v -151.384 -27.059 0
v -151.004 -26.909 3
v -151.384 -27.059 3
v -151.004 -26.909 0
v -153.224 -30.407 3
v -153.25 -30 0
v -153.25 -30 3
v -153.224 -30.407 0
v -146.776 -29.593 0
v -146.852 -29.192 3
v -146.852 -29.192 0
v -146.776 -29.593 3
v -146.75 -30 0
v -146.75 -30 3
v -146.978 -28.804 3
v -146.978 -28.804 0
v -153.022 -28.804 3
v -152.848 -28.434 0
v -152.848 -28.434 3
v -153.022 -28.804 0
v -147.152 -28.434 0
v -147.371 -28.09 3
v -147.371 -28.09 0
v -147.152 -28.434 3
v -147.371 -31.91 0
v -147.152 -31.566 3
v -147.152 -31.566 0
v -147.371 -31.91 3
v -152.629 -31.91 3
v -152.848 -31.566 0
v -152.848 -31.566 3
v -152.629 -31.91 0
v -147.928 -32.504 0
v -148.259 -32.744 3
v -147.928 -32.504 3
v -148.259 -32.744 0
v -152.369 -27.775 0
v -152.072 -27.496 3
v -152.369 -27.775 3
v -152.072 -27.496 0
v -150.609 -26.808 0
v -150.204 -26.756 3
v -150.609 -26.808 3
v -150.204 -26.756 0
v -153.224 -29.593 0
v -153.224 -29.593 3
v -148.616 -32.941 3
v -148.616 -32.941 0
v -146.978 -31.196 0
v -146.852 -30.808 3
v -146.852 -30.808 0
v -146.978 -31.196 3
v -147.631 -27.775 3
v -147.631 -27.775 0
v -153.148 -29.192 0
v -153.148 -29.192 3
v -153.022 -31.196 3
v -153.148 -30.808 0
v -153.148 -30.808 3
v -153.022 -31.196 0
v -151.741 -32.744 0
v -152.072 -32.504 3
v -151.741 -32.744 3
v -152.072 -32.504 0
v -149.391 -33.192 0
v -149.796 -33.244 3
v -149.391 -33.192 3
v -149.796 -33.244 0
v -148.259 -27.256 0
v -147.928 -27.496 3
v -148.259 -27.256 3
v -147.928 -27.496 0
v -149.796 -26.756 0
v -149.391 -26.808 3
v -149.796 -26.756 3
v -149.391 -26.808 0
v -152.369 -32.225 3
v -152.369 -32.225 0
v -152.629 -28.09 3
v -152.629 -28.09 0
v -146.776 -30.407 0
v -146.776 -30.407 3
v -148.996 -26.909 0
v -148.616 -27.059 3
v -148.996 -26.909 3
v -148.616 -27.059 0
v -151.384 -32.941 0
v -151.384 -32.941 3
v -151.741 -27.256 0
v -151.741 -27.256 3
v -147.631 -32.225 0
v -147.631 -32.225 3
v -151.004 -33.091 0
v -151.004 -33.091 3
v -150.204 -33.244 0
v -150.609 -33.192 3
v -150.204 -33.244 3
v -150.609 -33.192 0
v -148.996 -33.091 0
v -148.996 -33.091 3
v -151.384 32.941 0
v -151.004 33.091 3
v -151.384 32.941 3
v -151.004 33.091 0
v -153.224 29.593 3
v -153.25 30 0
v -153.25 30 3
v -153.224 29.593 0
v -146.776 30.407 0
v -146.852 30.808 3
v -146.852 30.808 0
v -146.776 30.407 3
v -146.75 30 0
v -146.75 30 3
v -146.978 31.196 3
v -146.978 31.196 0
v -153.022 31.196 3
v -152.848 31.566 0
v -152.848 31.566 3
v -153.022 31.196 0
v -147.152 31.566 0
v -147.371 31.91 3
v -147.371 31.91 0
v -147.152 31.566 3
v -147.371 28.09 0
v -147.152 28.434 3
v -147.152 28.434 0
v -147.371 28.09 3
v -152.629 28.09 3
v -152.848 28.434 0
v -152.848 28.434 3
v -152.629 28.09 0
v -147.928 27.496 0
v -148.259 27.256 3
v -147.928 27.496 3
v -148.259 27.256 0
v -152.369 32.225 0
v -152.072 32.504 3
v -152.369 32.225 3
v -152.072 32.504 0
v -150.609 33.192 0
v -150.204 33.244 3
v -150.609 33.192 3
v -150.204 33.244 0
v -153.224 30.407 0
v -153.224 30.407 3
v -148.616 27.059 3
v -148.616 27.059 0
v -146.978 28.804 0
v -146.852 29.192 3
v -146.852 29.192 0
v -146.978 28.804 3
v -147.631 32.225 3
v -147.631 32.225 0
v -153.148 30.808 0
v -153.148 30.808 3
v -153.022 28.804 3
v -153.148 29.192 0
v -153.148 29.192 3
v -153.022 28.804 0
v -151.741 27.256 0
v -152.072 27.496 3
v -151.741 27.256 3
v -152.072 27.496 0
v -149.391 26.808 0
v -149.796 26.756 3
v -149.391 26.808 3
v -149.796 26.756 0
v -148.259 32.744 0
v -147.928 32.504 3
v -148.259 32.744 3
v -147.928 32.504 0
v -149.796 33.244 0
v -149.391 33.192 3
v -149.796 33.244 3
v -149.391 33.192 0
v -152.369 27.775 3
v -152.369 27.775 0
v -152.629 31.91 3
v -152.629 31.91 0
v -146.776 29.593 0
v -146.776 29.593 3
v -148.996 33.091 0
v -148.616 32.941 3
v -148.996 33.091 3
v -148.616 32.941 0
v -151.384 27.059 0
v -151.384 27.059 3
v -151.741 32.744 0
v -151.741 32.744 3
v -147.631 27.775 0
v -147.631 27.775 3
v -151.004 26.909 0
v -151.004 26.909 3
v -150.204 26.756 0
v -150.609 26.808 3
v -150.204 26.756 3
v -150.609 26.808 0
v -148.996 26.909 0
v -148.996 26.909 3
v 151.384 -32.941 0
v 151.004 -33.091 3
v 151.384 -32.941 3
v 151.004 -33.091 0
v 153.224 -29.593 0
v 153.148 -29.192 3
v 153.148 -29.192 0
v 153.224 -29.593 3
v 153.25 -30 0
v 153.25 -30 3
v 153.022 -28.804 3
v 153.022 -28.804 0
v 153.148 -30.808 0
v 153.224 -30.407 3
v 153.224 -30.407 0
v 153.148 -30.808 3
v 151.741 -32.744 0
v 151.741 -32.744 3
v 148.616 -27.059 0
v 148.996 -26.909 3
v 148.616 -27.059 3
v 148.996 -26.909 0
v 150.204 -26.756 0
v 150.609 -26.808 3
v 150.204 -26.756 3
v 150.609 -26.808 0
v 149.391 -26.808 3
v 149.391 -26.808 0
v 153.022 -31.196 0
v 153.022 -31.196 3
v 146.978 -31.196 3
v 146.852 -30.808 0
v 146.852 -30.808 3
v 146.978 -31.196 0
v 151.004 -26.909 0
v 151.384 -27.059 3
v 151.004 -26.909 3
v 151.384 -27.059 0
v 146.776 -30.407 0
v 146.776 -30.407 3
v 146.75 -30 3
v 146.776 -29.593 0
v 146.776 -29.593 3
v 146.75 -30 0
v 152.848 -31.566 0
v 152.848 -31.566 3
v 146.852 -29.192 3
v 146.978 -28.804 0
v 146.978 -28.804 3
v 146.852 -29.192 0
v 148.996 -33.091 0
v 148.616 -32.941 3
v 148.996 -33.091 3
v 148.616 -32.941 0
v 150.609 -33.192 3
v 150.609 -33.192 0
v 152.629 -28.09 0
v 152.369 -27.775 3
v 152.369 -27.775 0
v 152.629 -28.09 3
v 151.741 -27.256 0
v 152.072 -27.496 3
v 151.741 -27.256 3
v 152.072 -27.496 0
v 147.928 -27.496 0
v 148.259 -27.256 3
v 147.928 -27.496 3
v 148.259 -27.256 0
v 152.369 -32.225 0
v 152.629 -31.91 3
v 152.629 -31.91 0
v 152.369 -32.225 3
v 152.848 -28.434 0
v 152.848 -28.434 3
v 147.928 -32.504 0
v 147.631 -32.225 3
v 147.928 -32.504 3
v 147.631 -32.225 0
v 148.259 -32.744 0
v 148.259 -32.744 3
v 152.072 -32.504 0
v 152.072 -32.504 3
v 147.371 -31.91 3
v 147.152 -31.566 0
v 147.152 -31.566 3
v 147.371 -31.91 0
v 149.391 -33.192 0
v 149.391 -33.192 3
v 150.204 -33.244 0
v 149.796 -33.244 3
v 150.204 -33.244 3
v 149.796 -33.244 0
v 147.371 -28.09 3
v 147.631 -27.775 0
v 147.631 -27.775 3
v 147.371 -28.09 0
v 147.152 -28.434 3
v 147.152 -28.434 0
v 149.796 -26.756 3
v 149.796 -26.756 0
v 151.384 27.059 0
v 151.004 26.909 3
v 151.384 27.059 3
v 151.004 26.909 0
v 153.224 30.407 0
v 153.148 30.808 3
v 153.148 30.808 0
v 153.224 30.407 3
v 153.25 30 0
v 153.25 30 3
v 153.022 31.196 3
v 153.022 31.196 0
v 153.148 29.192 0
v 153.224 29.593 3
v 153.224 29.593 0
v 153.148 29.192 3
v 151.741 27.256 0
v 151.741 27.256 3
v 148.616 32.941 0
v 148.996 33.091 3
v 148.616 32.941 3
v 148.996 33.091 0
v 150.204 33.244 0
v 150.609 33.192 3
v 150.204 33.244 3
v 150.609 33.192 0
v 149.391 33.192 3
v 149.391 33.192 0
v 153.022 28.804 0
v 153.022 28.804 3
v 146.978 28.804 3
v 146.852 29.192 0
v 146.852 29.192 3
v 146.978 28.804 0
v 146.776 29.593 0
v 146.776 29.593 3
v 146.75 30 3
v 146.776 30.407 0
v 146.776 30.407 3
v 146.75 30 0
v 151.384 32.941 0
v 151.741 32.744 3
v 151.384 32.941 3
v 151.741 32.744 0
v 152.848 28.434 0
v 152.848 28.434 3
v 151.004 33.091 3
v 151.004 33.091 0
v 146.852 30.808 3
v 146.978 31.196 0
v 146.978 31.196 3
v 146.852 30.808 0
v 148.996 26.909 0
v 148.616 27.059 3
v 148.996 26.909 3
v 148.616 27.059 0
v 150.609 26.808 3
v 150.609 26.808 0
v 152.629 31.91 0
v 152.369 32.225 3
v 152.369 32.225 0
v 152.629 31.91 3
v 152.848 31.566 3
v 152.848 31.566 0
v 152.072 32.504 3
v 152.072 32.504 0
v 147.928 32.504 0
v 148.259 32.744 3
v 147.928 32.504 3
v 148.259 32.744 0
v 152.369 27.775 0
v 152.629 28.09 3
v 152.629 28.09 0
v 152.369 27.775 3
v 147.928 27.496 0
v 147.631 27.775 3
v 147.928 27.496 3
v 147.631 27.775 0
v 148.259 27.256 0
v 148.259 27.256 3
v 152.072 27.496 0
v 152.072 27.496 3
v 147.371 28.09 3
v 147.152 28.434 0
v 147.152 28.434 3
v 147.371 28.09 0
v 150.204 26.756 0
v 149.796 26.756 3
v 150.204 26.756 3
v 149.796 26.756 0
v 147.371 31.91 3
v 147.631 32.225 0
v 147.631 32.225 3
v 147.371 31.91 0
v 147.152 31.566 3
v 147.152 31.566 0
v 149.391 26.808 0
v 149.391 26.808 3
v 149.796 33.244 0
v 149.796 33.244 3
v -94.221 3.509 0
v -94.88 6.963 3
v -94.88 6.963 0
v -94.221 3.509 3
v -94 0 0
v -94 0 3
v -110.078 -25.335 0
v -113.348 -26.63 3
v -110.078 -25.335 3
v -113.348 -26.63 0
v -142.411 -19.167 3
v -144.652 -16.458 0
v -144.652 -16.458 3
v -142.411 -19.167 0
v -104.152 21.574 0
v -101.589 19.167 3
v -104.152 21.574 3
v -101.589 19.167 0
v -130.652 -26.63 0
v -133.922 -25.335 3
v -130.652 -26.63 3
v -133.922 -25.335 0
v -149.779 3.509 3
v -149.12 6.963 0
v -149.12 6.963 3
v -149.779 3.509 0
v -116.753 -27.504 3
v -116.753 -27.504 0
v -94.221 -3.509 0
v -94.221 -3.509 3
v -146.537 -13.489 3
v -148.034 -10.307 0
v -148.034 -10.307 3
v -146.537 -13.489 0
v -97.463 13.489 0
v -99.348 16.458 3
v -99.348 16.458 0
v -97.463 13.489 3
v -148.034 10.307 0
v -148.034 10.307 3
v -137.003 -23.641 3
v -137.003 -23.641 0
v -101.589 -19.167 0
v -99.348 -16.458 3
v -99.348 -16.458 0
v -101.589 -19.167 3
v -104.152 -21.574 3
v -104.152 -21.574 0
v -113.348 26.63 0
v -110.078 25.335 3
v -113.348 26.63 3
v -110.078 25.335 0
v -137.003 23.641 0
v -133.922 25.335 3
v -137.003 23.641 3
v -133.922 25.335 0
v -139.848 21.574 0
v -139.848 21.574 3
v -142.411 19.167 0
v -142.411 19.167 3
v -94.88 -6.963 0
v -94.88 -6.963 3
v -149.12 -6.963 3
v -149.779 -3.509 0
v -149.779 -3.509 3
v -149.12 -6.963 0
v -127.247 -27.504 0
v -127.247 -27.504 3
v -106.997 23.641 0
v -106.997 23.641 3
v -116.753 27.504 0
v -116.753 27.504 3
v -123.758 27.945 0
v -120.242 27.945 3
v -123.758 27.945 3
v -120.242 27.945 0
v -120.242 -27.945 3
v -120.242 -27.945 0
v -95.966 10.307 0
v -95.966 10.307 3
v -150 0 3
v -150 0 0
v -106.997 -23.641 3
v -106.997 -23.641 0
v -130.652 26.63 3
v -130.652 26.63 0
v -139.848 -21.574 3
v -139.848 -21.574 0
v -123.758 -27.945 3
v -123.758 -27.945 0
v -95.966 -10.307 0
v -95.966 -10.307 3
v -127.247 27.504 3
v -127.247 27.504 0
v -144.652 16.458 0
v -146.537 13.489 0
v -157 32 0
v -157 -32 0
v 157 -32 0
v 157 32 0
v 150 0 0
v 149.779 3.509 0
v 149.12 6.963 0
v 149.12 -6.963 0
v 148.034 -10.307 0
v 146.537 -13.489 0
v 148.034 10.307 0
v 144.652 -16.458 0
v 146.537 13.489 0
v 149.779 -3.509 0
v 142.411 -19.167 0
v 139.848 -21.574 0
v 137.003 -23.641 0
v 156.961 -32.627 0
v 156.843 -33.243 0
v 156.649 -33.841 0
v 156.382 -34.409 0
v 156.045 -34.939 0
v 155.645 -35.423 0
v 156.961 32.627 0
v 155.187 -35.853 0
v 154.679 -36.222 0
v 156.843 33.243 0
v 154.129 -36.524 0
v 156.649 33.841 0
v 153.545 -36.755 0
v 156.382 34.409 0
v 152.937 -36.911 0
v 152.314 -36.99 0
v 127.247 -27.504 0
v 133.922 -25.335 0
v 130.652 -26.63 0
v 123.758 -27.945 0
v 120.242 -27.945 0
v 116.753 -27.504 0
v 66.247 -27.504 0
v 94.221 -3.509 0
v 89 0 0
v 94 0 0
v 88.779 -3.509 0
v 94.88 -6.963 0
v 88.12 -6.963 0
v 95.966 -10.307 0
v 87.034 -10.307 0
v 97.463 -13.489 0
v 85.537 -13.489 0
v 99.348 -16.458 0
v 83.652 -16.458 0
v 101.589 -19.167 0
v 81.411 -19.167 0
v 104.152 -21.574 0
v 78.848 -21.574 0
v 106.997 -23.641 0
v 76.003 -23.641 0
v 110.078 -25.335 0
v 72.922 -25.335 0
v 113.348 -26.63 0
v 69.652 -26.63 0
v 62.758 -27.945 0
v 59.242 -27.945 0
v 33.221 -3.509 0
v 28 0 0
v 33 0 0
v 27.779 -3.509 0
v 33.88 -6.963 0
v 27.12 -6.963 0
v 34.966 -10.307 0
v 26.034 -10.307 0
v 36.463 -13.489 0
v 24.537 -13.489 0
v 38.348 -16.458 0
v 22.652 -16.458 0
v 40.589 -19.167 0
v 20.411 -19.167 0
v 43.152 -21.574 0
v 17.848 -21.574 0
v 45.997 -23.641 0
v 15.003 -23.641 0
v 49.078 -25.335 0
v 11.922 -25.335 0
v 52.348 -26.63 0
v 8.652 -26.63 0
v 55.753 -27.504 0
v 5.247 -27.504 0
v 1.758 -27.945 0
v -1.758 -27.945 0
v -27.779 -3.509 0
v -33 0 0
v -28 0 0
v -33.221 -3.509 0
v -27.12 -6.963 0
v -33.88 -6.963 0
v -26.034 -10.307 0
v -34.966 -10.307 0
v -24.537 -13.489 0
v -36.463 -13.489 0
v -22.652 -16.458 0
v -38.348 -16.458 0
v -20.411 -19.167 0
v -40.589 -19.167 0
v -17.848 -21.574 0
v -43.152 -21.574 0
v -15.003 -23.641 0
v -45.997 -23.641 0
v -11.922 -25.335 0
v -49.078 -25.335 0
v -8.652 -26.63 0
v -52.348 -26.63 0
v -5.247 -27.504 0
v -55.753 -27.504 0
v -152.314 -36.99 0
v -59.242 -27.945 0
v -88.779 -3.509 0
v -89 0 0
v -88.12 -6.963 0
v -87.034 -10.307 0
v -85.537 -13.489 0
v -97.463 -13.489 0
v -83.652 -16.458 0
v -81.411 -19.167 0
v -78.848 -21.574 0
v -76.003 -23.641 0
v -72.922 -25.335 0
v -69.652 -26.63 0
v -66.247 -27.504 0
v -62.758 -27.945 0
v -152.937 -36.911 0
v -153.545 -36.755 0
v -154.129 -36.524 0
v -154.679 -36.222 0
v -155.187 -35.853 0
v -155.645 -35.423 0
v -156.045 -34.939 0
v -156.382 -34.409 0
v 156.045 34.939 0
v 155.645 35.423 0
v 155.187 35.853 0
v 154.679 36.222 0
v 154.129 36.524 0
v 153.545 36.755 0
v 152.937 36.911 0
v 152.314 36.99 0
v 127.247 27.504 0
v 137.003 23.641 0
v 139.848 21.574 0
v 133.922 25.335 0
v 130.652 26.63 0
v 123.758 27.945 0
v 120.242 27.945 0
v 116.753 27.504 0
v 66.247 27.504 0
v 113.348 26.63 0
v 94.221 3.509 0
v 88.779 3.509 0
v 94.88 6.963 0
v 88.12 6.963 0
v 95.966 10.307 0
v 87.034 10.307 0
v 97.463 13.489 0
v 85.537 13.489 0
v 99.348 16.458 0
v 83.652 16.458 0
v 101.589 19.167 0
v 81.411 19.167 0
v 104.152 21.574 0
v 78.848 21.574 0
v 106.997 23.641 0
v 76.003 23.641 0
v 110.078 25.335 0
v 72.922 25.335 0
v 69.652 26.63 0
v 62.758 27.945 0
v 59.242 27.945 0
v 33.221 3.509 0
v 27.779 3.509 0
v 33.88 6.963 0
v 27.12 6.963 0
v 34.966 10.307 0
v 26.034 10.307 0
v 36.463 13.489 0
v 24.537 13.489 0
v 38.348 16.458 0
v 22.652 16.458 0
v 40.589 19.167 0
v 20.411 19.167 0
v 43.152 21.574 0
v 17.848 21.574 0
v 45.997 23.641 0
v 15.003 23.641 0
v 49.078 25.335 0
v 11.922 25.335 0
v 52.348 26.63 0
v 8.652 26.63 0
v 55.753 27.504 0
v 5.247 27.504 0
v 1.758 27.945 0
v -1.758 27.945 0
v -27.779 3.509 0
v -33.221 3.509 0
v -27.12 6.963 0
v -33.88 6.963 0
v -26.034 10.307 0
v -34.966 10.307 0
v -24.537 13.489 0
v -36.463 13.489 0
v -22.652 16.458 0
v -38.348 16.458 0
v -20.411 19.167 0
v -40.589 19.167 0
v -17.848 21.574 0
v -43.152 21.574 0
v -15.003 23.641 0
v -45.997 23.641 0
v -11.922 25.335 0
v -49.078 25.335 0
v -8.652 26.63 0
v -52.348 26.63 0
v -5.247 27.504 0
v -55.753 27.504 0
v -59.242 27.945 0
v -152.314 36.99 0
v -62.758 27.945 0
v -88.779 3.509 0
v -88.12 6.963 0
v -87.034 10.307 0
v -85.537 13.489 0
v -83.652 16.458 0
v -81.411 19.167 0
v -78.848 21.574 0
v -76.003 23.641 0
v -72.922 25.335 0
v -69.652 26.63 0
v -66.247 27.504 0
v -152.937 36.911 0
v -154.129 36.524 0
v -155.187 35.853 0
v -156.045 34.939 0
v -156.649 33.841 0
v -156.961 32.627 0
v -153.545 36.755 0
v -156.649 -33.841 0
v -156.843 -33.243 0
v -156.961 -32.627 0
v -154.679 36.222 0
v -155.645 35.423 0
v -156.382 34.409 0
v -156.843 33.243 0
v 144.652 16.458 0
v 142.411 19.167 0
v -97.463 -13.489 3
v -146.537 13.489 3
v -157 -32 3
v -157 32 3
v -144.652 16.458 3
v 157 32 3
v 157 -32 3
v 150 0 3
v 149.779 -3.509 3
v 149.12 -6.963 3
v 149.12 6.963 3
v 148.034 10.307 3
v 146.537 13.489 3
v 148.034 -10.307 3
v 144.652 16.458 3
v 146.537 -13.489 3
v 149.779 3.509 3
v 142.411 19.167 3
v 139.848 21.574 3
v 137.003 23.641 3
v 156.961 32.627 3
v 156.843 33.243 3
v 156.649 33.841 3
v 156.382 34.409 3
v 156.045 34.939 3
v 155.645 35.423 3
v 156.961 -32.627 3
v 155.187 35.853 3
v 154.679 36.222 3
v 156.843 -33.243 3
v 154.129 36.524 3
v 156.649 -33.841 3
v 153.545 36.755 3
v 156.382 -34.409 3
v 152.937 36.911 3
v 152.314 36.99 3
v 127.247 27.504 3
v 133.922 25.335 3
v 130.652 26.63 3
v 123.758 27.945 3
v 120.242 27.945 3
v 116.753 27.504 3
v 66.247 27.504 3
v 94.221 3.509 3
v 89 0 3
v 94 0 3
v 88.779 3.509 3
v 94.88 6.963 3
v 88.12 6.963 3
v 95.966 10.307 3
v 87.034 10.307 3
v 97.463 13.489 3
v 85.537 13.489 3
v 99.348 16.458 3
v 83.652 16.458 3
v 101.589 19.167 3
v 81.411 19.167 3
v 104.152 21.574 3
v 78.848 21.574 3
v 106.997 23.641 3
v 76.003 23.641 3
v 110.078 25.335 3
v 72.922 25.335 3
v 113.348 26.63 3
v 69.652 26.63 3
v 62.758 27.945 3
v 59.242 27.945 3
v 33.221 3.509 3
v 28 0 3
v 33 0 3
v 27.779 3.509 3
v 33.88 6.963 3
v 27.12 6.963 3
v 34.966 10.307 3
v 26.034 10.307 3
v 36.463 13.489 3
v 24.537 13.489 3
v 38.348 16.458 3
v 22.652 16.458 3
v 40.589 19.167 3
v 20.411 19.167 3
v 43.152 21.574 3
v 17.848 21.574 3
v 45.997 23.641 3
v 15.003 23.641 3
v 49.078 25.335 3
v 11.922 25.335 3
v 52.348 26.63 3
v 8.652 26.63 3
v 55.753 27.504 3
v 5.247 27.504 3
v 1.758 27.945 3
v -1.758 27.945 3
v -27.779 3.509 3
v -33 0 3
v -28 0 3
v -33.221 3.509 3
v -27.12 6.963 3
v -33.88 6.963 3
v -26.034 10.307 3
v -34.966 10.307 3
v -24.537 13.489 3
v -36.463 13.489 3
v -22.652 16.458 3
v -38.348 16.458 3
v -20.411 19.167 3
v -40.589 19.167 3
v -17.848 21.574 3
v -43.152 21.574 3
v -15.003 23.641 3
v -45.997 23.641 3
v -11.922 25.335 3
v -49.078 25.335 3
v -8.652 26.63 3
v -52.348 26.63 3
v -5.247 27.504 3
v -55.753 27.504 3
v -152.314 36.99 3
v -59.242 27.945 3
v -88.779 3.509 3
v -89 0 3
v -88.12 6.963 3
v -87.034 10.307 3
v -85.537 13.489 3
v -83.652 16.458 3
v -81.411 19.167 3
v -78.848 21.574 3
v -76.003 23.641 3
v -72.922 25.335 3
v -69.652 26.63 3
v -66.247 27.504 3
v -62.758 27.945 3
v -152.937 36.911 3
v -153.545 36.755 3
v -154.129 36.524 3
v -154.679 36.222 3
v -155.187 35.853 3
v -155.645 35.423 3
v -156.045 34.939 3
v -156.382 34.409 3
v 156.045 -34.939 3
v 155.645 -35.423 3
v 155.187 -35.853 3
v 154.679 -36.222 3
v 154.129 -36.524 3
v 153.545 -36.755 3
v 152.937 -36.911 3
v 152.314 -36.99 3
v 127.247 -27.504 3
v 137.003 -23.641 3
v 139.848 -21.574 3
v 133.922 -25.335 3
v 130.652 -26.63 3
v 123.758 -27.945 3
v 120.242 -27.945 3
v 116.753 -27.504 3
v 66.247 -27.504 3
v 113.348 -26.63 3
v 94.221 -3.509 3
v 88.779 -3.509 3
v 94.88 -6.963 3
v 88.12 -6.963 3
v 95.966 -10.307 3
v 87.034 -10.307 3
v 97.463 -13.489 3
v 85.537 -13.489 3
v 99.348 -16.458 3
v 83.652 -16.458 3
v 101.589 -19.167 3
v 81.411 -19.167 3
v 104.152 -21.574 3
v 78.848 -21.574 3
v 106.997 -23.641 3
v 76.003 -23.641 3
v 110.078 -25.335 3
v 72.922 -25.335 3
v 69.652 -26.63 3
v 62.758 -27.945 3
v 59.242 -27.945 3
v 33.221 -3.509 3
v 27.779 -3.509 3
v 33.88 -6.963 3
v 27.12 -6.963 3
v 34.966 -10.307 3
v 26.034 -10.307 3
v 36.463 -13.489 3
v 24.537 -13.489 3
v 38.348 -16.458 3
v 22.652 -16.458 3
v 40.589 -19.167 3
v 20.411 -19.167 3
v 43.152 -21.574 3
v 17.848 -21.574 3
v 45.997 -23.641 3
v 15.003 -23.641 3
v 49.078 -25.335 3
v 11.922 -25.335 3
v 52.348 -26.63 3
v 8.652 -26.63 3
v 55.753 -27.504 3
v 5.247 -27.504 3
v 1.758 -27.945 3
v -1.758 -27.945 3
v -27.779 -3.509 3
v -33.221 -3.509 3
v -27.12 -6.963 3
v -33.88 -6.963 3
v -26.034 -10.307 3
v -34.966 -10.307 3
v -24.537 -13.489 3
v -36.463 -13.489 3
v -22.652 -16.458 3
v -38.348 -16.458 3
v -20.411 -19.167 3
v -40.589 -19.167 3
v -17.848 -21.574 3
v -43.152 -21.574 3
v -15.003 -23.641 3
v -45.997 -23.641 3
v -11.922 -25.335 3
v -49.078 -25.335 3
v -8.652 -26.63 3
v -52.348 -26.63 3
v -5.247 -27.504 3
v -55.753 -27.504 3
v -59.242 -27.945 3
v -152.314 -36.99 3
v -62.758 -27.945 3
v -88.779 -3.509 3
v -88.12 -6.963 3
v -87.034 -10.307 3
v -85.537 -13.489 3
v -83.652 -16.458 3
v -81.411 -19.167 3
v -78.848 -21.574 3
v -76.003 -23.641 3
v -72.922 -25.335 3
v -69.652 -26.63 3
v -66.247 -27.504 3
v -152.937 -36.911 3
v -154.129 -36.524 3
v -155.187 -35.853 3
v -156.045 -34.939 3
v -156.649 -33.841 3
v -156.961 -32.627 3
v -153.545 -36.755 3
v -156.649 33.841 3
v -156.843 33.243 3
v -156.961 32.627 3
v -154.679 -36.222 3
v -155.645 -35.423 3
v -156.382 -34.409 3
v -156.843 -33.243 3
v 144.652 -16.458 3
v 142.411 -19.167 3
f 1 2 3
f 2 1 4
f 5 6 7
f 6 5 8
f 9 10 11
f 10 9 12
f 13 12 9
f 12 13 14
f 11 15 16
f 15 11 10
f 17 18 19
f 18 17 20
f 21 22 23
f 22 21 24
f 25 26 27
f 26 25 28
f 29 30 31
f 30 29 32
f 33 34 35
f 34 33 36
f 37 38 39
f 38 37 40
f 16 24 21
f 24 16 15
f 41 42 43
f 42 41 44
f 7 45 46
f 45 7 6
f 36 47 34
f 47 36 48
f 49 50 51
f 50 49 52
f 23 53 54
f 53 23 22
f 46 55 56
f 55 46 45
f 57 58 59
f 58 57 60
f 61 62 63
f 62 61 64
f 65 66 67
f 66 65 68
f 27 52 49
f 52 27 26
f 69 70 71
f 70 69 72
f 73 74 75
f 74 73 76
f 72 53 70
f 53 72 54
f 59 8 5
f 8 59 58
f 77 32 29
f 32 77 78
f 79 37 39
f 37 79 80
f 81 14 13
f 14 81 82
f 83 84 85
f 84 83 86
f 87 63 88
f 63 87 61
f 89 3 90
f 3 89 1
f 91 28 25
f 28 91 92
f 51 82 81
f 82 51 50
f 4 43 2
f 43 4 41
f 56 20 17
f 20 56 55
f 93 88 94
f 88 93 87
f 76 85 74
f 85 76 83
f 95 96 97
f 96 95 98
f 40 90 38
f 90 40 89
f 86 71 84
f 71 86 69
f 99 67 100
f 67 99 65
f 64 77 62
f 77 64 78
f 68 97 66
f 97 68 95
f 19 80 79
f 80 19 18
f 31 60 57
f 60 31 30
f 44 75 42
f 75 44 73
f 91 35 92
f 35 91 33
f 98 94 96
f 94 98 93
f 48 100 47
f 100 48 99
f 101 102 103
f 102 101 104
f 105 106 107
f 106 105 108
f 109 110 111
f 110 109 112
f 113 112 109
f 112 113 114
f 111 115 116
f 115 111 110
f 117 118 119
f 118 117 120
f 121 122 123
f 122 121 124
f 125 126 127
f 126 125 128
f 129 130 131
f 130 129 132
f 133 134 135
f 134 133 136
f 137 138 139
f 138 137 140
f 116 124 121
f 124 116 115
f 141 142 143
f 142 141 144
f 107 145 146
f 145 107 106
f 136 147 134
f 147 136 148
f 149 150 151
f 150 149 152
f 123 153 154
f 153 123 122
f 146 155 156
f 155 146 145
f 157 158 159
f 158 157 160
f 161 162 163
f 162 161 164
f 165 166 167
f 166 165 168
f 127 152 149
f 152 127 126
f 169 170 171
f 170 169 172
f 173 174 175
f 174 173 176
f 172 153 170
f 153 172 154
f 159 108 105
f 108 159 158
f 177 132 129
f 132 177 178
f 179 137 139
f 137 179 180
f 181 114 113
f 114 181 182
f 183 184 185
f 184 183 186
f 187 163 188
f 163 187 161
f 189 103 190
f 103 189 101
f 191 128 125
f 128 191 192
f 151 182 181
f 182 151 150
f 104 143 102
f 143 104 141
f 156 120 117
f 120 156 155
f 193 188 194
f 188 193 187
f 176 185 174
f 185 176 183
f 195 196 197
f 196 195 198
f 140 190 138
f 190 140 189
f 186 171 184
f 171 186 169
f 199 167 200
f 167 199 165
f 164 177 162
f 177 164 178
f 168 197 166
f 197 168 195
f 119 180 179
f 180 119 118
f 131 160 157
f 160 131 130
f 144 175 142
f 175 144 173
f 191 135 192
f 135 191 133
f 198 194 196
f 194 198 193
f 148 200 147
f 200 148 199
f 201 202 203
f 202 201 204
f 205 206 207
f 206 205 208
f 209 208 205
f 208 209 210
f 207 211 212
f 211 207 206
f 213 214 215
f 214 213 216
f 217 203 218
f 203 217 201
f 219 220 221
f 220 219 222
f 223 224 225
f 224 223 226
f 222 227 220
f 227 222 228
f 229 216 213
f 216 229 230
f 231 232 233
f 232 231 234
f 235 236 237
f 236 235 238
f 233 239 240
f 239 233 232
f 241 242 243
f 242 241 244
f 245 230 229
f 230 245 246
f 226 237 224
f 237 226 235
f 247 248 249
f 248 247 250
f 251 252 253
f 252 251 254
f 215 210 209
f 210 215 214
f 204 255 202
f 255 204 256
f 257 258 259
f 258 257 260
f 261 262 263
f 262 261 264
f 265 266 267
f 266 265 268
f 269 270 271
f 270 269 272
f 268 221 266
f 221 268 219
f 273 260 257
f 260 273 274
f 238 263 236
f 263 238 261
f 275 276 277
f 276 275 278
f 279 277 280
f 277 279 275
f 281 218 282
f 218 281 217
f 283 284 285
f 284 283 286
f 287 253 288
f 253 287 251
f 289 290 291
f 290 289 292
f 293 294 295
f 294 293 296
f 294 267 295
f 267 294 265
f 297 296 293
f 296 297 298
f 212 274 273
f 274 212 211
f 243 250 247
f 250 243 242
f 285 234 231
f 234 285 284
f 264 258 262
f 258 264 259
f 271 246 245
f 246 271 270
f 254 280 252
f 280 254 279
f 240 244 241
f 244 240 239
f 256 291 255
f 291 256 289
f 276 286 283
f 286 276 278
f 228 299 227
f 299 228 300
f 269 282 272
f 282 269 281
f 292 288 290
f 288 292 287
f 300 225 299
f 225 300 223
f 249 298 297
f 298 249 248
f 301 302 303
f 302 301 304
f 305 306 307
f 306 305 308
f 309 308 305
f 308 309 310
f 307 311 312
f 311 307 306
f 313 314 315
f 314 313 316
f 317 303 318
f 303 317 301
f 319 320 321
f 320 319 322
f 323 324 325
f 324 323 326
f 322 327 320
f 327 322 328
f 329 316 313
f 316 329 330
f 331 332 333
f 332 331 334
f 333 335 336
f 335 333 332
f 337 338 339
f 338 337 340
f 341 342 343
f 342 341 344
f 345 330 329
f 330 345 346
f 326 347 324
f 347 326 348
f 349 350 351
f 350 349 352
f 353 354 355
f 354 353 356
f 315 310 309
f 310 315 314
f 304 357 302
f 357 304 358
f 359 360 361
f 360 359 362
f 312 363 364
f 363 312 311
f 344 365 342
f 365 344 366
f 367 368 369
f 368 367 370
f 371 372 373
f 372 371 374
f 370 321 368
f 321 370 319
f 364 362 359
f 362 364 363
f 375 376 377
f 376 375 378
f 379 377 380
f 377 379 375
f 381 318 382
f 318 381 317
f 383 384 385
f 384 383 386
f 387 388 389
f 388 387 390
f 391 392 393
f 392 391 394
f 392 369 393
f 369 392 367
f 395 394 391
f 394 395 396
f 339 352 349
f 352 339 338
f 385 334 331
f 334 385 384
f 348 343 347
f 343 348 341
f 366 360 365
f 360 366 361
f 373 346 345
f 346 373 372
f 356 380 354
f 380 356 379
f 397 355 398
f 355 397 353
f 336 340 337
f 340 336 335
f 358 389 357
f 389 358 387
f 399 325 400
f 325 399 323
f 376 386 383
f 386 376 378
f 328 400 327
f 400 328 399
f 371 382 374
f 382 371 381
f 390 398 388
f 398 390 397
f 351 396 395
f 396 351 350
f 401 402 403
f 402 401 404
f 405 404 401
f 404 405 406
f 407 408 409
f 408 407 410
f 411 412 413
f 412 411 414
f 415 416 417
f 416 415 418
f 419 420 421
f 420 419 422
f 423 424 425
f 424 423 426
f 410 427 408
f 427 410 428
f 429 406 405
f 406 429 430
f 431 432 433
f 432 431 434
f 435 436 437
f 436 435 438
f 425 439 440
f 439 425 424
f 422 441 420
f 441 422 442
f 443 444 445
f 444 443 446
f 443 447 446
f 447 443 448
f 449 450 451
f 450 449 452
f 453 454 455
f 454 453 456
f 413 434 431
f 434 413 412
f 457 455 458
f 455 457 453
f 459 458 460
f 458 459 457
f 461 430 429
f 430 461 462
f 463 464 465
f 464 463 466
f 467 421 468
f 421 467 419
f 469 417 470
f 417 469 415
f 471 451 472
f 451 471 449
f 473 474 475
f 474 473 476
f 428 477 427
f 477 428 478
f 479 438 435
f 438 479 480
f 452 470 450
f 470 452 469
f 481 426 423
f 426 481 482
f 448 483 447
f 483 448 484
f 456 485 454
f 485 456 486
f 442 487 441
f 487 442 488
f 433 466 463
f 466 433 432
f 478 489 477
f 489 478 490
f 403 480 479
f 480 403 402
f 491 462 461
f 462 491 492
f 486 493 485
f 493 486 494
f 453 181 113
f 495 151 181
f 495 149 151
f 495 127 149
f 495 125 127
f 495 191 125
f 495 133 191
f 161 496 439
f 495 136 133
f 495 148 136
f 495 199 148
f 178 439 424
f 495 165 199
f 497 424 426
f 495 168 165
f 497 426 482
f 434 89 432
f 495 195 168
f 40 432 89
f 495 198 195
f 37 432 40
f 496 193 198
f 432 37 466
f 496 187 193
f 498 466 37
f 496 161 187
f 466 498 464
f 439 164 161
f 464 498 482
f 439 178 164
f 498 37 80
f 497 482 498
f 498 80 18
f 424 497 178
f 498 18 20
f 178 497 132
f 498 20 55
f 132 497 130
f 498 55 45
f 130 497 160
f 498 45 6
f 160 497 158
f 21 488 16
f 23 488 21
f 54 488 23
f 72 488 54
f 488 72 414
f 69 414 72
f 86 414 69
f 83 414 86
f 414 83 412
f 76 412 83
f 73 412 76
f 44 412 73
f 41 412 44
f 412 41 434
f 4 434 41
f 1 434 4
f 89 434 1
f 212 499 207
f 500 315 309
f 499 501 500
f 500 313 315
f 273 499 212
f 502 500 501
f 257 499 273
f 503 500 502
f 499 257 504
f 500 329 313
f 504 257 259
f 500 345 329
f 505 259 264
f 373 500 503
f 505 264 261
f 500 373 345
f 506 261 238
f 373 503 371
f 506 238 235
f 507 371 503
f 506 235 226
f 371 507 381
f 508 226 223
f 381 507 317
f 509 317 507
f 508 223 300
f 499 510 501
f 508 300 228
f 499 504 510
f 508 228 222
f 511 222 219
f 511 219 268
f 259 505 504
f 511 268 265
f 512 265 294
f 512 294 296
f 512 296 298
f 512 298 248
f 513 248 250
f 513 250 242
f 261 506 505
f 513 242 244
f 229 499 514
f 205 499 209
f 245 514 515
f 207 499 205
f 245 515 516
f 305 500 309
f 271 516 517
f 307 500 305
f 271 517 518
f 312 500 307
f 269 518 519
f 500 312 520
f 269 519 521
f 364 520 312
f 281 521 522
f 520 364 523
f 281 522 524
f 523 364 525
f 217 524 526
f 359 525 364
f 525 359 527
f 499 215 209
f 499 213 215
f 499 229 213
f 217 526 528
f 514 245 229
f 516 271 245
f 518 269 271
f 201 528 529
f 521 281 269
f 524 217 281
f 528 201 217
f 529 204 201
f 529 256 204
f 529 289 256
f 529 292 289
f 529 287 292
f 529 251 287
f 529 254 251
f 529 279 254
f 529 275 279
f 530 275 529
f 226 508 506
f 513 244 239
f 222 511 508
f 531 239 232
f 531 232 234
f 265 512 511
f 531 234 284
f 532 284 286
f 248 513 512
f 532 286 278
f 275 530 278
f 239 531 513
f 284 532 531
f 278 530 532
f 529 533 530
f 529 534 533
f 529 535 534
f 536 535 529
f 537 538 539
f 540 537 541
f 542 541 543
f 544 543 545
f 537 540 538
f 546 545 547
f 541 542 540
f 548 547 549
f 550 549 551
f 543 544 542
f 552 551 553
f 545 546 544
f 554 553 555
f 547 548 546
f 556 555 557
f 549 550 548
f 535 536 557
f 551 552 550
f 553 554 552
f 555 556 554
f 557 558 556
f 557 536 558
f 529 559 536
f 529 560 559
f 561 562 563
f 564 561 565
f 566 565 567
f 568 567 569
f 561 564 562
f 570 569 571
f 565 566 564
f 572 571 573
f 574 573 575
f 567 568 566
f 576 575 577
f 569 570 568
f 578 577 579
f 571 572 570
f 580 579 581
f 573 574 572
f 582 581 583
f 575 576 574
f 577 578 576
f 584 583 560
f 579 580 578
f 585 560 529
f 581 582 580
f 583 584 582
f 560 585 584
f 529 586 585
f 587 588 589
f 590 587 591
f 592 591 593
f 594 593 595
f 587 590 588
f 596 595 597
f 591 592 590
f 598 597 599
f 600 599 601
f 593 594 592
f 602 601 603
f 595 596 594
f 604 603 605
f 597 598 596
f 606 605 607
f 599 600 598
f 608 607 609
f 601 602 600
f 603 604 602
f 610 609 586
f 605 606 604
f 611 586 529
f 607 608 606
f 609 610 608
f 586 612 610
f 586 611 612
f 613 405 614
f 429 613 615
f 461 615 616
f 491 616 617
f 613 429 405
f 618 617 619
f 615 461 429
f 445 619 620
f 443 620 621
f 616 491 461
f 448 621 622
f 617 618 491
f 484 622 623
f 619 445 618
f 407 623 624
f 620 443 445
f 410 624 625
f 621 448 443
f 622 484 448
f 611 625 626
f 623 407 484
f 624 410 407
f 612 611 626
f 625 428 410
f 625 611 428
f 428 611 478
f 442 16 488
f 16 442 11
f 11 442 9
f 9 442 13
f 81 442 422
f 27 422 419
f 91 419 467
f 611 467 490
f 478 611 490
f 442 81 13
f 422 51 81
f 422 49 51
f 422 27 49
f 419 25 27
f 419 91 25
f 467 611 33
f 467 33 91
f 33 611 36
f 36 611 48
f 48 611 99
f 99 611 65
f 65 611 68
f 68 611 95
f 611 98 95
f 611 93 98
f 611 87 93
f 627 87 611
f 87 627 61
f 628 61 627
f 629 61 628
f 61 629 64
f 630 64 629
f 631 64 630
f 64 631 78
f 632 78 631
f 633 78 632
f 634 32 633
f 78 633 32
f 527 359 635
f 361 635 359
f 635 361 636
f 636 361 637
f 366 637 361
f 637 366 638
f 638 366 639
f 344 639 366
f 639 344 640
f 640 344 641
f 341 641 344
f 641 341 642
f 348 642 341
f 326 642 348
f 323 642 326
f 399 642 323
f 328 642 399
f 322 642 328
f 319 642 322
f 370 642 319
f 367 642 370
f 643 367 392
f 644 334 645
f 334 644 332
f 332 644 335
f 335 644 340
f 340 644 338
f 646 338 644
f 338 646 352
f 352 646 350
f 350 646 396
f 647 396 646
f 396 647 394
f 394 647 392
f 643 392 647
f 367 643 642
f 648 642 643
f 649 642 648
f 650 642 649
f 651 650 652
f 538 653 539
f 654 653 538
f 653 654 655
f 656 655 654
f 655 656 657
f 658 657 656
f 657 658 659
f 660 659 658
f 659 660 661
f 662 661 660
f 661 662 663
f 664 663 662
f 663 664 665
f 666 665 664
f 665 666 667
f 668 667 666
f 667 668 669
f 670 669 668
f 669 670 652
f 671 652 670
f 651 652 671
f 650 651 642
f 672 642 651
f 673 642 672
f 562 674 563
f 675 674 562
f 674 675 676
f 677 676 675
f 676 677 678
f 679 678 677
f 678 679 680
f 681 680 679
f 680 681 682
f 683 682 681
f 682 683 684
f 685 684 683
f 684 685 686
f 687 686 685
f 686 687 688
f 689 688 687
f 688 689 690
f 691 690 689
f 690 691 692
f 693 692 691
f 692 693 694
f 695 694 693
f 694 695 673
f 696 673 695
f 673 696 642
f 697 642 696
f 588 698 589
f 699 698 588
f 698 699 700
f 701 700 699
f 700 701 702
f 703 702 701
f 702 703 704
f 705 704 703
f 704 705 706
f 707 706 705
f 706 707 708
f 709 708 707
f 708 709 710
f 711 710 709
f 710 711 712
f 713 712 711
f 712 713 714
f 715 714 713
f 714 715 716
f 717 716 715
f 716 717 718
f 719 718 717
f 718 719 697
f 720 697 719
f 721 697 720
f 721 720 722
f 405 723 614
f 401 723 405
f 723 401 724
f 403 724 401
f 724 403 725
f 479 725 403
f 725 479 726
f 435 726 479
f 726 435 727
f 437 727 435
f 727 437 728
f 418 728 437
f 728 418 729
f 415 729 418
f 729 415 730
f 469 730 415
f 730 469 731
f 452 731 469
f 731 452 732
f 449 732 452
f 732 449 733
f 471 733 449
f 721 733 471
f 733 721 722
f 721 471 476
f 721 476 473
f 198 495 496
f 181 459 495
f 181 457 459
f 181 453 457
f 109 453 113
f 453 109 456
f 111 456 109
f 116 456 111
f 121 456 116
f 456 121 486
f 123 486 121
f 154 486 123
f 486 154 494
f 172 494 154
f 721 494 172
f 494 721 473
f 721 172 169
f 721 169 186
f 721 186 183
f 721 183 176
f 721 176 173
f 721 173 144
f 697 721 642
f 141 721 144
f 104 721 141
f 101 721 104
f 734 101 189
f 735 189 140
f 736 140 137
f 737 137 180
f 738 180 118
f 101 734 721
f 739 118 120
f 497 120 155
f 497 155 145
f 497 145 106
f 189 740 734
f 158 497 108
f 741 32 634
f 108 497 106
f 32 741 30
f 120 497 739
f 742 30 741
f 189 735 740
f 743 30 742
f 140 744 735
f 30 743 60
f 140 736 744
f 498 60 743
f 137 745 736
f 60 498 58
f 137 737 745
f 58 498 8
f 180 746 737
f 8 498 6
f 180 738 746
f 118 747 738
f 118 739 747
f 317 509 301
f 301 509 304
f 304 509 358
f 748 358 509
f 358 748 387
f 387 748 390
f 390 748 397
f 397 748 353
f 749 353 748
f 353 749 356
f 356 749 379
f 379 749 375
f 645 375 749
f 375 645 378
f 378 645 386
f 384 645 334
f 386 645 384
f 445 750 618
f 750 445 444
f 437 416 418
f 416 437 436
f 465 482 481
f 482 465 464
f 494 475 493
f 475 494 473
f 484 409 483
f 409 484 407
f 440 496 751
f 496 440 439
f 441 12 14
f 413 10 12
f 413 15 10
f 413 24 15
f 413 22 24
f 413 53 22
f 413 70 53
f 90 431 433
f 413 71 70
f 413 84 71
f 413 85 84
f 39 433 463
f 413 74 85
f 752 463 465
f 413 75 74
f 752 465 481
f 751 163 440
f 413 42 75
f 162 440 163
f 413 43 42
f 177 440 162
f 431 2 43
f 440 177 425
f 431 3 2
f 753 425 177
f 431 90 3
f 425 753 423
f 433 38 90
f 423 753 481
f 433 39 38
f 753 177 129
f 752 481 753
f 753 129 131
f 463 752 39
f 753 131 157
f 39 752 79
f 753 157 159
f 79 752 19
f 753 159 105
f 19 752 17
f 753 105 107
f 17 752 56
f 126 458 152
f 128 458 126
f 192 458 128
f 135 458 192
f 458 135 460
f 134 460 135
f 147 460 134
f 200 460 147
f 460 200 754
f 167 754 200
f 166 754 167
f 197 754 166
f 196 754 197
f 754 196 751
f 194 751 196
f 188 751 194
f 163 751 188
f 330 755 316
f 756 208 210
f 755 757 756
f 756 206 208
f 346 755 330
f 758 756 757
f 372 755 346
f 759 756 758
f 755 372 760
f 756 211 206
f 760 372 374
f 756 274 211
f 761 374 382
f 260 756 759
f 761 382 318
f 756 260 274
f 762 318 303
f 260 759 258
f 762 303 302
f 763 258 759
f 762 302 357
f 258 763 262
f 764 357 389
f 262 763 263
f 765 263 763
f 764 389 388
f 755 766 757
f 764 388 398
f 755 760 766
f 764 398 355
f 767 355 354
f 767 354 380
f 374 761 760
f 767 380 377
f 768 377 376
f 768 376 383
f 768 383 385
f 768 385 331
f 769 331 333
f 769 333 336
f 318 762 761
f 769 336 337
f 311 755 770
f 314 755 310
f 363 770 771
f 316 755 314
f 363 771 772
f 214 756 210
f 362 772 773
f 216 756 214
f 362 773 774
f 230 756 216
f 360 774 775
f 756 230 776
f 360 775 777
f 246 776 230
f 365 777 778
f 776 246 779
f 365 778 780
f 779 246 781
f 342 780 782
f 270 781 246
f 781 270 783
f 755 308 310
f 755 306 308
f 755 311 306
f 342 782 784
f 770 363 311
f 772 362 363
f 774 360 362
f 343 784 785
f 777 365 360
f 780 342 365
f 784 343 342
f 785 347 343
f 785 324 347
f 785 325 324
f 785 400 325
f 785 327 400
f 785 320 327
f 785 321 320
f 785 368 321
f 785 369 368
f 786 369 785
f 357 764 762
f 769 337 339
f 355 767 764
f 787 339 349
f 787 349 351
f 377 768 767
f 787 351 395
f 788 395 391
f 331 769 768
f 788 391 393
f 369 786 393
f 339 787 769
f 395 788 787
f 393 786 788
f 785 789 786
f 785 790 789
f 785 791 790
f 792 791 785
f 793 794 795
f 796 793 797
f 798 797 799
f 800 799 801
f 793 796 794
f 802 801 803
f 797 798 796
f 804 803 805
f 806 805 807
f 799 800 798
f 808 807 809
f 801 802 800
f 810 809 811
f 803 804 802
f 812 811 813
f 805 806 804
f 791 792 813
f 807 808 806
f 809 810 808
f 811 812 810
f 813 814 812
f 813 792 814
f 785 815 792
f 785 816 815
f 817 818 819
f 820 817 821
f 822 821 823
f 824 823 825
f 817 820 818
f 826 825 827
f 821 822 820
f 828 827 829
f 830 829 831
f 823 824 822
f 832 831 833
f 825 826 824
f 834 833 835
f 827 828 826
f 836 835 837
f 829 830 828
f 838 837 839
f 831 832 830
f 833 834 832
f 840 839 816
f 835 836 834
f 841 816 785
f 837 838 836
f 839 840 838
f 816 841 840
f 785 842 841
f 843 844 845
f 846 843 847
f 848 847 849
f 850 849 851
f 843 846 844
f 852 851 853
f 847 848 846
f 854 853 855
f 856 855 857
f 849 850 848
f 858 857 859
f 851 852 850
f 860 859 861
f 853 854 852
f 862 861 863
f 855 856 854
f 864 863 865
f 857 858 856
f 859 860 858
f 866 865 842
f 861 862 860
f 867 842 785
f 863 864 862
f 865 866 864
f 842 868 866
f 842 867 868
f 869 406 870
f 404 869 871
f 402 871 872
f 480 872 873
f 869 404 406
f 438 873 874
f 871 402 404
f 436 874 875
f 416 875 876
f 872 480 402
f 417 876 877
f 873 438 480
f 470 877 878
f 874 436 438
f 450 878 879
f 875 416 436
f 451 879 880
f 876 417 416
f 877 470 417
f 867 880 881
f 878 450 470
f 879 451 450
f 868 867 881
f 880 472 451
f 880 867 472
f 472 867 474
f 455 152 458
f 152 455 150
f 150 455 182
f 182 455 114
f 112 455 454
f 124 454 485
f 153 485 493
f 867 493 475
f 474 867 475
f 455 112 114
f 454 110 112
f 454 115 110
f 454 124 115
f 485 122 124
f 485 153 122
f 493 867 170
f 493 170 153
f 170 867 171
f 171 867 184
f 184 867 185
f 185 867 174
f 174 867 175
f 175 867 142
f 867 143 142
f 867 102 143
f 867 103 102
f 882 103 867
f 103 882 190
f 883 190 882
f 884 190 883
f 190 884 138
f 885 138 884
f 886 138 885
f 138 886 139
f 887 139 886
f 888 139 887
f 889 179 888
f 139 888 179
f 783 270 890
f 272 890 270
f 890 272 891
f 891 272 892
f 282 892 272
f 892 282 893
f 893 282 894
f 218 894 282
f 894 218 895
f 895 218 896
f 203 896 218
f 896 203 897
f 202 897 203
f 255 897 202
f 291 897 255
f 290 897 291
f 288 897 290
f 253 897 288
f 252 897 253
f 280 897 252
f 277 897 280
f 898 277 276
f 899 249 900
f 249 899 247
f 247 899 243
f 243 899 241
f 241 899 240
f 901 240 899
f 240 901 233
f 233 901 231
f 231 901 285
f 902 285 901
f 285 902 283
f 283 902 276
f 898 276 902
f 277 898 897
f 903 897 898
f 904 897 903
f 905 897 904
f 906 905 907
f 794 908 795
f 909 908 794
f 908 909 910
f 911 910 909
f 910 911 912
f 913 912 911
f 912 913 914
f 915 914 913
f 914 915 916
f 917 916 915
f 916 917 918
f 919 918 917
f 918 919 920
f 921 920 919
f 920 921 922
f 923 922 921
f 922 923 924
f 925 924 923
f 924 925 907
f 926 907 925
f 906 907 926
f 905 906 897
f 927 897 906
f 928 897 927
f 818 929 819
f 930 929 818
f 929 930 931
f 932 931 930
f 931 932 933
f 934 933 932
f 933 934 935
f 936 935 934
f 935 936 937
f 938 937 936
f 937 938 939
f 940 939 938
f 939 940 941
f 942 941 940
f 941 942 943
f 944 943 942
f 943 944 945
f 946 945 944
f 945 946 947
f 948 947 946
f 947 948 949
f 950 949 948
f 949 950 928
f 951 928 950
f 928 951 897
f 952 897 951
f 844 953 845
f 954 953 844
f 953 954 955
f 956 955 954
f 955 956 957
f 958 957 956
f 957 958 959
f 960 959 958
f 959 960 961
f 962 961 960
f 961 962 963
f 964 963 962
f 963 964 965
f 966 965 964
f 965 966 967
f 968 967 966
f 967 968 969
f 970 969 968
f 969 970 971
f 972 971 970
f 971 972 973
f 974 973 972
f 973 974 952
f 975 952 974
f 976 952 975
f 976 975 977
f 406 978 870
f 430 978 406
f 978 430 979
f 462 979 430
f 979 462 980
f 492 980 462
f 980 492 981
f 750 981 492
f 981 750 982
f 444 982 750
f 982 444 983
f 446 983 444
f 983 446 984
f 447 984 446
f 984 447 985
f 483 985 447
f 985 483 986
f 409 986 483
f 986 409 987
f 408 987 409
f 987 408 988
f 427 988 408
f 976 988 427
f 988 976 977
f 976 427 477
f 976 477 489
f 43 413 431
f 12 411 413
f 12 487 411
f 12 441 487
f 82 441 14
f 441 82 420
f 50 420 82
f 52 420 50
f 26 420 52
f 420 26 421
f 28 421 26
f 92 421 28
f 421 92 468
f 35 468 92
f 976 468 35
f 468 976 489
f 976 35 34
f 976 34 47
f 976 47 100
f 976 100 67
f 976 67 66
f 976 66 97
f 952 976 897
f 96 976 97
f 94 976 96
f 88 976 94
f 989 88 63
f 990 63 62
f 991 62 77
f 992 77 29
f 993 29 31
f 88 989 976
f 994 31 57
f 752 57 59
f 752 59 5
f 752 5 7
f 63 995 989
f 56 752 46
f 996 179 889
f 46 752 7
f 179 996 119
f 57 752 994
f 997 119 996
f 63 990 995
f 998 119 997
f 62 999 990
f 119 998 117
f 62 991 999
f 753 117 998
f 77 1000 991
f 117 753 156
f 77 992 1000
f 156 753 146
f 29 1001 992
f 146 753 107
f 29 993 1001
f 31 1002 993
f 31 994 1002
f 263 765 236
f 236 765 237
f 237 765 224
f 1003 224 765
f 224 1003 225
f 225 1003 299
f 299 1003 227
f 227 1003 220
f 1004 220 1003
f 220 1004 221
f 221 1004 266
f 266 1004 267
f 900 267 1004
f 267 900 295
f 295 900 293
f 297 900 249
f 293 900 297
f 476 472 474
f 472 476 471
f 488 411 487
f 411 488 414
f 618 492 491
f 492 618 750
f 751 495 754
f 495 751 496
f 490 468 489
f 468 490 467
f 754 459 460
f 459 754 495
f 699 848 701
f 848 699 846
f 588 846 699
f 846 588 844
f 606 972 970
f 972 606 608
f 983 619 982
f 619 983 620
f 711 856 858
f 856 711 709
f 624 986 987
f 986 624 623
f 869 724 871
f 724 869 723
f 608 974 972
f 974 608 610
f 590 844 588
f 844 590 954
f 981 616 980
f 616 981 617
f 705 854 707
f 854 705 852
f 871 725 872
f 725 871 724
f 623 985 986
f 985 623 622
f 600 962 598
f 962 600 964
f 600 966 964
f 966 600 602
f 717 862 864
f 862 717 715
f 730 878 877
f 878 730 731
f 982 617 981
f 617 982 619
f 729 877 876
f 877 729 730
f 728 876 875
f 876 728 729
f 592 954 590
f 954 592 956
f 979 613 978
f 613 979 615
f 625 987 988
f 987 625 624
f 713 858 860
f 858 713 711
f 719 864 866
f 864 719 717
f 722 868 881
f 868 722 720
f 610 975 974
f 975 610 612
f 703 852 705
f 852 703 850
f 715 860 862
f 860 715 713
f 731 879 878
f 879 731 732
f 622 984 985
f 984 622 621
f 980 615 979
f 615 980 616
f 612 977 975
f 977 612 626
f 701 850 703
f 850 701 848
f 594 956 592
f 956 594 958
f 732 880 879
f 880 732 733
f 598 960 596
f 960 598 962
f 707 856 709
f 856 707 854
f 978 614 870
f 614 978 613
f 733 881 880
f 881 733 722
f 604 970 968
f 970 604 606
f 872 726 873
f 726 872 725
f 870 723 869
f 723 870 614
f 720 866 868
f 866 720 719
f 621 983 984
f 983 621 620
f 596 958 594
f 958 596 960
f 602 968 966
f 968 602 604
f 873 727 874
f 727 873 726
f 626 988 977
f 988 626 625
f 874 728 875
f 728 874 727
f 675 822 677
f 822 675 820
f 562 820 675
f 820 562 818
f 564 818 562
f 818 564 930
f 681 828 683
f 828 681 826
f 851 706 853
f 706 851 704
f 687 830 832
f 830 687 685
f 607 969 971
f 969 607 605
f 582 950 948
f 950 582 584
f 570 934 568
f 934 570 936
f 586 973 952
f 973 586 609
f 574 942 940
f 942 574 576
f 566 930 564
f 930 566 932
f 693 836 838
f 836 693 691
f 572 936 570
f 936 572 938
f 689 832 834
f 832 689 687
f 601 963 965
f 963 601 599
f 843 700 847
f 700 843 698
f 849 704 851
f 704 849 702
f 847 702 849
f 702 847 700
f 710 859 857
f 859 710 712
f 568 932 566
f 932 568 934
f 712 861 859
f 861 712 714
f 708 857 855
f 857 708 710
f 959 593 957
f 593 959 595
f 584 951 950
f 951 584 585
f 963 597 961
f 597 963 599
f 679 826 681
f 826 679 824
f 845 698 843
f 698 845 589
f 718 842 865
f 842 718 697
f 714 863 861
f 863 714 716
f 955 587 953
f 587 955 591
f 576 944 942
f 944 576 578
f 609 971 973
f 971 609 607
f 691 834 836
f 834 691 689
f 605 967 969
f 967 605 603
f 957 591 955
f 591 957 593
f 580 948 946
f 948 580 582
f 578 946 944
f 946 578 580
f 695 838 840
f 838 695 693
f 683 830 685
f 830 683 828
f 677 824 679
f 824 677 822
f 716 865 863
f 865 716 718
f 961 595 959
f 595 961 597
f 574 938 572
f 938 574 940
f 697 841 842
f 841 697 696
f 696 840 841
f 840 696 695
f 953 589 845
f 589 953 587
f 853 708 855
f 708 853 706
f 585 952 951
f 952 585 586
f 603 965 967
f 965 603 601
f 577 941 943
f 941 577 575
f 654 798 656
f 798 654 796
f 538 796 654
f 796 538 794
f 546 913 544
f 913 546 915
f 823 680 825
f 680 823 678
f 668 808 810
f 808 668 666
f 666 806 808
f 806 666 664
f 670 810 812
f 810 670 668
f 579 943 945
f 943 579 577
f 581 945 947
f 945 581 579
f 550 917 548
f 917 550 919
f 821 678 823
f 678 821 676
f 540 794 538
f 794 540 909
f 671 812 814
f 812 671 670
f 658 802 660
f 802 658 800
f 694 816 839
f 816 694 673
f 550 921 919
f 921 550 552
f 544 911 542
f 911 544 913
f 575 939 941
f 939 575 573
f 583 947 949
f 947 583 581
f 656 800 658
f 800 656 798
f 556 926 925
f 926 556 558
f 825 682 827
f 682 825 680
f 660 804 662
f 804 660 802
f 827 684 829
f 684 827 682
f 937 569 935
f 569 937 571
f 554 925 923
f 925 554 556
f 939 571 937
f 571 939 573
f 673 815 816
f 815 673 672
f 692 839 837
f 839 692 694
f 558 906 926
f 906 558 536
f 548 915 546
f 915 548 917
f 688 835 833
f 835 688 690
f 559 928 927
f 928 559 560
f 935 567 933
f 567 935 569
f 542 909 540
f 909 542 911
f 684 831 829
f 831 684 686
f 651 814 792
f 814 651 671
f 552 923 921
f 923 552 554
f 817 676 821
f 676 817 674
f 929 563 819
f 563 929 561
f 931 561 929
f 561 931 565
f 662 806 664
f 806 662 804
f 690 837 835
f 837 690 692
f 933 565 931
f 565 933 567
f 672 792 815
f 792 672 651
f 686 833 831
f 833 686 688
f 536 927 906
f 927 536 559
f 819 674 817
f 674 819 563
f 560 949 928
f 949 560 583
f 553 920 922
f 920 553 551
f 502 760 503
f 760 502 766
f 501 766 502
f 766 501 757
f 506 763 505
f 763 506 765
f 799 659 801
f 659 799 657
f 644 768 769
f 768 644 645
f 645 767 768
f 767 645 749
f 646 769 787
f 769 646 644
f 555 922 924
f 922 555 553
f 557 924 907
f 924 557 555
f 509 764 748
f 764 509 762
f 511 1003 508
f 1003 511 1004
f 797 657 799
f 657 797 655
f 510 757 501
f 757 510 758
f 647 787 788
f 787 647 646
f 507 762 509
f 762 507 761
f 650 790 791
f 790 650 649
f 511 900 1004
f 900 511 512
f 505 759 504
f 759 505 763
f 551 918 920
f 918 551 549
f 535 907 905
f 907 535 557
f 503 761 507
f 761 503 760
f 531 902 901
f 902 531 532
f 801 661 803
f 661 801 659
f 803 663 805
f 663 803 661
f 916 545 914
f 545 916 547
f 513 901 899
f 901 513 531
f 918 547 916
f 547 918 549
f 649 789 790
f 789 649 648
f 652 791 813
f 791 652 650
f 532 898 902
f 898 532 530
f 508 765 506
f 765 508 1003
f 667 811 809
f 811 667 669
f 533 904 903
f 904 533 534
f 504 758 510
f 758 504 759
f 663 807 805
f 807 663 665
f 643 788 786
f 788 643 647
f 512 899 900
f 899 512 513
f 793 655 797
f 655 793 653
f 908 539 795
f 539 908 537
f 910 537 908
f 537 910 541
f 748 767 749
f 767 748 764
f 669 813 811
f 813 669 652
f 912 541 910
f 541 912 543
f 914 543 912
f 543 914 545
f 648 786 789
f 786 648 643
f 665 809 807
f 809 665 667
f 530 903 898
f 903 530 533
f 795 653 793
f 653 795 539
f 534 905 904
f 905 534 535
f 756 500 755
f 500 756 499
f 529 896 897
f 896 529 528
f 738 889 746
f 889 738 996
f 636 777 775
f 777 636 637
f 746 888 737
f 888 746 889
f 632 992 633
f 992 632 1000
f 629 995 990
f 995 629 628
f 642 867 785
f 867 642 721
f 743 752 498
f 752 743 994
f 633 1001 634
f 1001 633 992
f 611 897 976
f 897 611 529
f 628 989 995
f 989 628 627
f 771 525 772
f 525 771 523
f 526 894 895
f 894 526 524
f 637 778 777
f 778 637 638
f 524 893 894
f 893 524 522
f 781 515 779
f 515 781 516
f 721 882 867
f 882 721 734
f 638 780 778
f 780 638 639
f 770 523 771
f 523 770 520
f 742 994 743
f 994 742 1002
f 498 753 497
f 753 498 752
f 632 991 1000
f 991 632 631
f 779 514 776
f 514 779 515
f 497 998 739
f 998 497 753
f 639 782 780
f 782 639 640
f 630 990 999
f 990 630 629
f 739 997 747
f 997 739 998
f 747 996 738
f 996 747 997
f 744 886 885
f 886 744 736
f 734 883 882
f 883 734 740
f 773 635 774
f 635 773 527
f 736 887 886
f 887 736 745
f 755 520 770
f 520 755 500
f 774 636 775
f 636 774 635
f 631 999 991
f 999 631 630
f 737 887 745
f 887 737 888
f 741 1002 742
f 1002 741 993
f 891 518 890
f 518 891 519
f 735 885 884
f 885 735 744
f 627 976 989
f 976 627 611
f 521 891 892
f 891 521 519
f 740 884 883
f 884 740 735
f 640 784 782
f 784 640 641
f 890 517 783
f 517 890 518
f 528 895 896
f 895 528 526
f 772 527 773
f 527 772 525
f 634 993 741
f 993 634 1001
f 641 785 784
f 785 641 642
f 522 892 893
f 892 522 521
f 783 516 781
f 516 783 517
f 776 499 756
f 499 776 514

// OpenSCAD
$fn = 50;

difference() {
	union() {
		hull() {
			translate(v = [-152.0, 32.0, 0]) {
				cylinder(h = 3, r = 5);
			}
			translate(v = [152.0, 32.0, 0]) {
				cylinder(h = 3, r = 5);
			}
			translate(v = [-152.0, -32.0, 0]) {
				cylinder(h = 3, r = 5);
			}
			translate(v = [152.0, -32.0, 0]) {
				cylinder(h = 3, r = 5);
			}
		}
	}
	union() {
		translate(v = [-150.0, -30.0, -100.0]) {
			cylinder(h = 200, r = 3.25);
		}
		translate(v = [-150.0, 30.0, -100.0]) {
			cylinder(h = 200, r = 3.25);
		}
		translate(v = [150.0, -30.0, -100.0]) {
			cylinder(h = 200, r = 3.25);
		}
		translate(v = [150.0, 30.0, -100.0]) {
			cylinder(h = 200, r = 3.25);
		}
		translate(v = [-150.0, -30.0, -100.0]) {
			cylinder(h = 200, r = 1.8);
		}
		translate(v = [-150.0, 30.0, -100.0]) {
			cylinder(h = 200, r = 1.8);
		}
		translate(v = [150.0, -30.0, -100.0]) {
			cylinder(h = 200, r = 1.8);
		}
		translate(v = [150.0, 30.0, -100.0]) {
			cylinder(h = 200, r = 1.8);
		}
		translate(v = [-122.0, 0, 0.0]) {
			cylinder(h = 3, r = 28.0);
		}
		translate(v = [-61.0, 0, 0.0]) {
			cylinder(h = 3, r = 28.0);
		}
		cylinder(h = 3, r = 28.0);
		translate(v = [61.0, 0, 0.0]) {
			cylinder(h = 3, r = 28.0);
		}
		translate(v = [122.0, 0, 0.0]) {
			cylinder(h = 3, r = 28.0);
		}
	}
}
